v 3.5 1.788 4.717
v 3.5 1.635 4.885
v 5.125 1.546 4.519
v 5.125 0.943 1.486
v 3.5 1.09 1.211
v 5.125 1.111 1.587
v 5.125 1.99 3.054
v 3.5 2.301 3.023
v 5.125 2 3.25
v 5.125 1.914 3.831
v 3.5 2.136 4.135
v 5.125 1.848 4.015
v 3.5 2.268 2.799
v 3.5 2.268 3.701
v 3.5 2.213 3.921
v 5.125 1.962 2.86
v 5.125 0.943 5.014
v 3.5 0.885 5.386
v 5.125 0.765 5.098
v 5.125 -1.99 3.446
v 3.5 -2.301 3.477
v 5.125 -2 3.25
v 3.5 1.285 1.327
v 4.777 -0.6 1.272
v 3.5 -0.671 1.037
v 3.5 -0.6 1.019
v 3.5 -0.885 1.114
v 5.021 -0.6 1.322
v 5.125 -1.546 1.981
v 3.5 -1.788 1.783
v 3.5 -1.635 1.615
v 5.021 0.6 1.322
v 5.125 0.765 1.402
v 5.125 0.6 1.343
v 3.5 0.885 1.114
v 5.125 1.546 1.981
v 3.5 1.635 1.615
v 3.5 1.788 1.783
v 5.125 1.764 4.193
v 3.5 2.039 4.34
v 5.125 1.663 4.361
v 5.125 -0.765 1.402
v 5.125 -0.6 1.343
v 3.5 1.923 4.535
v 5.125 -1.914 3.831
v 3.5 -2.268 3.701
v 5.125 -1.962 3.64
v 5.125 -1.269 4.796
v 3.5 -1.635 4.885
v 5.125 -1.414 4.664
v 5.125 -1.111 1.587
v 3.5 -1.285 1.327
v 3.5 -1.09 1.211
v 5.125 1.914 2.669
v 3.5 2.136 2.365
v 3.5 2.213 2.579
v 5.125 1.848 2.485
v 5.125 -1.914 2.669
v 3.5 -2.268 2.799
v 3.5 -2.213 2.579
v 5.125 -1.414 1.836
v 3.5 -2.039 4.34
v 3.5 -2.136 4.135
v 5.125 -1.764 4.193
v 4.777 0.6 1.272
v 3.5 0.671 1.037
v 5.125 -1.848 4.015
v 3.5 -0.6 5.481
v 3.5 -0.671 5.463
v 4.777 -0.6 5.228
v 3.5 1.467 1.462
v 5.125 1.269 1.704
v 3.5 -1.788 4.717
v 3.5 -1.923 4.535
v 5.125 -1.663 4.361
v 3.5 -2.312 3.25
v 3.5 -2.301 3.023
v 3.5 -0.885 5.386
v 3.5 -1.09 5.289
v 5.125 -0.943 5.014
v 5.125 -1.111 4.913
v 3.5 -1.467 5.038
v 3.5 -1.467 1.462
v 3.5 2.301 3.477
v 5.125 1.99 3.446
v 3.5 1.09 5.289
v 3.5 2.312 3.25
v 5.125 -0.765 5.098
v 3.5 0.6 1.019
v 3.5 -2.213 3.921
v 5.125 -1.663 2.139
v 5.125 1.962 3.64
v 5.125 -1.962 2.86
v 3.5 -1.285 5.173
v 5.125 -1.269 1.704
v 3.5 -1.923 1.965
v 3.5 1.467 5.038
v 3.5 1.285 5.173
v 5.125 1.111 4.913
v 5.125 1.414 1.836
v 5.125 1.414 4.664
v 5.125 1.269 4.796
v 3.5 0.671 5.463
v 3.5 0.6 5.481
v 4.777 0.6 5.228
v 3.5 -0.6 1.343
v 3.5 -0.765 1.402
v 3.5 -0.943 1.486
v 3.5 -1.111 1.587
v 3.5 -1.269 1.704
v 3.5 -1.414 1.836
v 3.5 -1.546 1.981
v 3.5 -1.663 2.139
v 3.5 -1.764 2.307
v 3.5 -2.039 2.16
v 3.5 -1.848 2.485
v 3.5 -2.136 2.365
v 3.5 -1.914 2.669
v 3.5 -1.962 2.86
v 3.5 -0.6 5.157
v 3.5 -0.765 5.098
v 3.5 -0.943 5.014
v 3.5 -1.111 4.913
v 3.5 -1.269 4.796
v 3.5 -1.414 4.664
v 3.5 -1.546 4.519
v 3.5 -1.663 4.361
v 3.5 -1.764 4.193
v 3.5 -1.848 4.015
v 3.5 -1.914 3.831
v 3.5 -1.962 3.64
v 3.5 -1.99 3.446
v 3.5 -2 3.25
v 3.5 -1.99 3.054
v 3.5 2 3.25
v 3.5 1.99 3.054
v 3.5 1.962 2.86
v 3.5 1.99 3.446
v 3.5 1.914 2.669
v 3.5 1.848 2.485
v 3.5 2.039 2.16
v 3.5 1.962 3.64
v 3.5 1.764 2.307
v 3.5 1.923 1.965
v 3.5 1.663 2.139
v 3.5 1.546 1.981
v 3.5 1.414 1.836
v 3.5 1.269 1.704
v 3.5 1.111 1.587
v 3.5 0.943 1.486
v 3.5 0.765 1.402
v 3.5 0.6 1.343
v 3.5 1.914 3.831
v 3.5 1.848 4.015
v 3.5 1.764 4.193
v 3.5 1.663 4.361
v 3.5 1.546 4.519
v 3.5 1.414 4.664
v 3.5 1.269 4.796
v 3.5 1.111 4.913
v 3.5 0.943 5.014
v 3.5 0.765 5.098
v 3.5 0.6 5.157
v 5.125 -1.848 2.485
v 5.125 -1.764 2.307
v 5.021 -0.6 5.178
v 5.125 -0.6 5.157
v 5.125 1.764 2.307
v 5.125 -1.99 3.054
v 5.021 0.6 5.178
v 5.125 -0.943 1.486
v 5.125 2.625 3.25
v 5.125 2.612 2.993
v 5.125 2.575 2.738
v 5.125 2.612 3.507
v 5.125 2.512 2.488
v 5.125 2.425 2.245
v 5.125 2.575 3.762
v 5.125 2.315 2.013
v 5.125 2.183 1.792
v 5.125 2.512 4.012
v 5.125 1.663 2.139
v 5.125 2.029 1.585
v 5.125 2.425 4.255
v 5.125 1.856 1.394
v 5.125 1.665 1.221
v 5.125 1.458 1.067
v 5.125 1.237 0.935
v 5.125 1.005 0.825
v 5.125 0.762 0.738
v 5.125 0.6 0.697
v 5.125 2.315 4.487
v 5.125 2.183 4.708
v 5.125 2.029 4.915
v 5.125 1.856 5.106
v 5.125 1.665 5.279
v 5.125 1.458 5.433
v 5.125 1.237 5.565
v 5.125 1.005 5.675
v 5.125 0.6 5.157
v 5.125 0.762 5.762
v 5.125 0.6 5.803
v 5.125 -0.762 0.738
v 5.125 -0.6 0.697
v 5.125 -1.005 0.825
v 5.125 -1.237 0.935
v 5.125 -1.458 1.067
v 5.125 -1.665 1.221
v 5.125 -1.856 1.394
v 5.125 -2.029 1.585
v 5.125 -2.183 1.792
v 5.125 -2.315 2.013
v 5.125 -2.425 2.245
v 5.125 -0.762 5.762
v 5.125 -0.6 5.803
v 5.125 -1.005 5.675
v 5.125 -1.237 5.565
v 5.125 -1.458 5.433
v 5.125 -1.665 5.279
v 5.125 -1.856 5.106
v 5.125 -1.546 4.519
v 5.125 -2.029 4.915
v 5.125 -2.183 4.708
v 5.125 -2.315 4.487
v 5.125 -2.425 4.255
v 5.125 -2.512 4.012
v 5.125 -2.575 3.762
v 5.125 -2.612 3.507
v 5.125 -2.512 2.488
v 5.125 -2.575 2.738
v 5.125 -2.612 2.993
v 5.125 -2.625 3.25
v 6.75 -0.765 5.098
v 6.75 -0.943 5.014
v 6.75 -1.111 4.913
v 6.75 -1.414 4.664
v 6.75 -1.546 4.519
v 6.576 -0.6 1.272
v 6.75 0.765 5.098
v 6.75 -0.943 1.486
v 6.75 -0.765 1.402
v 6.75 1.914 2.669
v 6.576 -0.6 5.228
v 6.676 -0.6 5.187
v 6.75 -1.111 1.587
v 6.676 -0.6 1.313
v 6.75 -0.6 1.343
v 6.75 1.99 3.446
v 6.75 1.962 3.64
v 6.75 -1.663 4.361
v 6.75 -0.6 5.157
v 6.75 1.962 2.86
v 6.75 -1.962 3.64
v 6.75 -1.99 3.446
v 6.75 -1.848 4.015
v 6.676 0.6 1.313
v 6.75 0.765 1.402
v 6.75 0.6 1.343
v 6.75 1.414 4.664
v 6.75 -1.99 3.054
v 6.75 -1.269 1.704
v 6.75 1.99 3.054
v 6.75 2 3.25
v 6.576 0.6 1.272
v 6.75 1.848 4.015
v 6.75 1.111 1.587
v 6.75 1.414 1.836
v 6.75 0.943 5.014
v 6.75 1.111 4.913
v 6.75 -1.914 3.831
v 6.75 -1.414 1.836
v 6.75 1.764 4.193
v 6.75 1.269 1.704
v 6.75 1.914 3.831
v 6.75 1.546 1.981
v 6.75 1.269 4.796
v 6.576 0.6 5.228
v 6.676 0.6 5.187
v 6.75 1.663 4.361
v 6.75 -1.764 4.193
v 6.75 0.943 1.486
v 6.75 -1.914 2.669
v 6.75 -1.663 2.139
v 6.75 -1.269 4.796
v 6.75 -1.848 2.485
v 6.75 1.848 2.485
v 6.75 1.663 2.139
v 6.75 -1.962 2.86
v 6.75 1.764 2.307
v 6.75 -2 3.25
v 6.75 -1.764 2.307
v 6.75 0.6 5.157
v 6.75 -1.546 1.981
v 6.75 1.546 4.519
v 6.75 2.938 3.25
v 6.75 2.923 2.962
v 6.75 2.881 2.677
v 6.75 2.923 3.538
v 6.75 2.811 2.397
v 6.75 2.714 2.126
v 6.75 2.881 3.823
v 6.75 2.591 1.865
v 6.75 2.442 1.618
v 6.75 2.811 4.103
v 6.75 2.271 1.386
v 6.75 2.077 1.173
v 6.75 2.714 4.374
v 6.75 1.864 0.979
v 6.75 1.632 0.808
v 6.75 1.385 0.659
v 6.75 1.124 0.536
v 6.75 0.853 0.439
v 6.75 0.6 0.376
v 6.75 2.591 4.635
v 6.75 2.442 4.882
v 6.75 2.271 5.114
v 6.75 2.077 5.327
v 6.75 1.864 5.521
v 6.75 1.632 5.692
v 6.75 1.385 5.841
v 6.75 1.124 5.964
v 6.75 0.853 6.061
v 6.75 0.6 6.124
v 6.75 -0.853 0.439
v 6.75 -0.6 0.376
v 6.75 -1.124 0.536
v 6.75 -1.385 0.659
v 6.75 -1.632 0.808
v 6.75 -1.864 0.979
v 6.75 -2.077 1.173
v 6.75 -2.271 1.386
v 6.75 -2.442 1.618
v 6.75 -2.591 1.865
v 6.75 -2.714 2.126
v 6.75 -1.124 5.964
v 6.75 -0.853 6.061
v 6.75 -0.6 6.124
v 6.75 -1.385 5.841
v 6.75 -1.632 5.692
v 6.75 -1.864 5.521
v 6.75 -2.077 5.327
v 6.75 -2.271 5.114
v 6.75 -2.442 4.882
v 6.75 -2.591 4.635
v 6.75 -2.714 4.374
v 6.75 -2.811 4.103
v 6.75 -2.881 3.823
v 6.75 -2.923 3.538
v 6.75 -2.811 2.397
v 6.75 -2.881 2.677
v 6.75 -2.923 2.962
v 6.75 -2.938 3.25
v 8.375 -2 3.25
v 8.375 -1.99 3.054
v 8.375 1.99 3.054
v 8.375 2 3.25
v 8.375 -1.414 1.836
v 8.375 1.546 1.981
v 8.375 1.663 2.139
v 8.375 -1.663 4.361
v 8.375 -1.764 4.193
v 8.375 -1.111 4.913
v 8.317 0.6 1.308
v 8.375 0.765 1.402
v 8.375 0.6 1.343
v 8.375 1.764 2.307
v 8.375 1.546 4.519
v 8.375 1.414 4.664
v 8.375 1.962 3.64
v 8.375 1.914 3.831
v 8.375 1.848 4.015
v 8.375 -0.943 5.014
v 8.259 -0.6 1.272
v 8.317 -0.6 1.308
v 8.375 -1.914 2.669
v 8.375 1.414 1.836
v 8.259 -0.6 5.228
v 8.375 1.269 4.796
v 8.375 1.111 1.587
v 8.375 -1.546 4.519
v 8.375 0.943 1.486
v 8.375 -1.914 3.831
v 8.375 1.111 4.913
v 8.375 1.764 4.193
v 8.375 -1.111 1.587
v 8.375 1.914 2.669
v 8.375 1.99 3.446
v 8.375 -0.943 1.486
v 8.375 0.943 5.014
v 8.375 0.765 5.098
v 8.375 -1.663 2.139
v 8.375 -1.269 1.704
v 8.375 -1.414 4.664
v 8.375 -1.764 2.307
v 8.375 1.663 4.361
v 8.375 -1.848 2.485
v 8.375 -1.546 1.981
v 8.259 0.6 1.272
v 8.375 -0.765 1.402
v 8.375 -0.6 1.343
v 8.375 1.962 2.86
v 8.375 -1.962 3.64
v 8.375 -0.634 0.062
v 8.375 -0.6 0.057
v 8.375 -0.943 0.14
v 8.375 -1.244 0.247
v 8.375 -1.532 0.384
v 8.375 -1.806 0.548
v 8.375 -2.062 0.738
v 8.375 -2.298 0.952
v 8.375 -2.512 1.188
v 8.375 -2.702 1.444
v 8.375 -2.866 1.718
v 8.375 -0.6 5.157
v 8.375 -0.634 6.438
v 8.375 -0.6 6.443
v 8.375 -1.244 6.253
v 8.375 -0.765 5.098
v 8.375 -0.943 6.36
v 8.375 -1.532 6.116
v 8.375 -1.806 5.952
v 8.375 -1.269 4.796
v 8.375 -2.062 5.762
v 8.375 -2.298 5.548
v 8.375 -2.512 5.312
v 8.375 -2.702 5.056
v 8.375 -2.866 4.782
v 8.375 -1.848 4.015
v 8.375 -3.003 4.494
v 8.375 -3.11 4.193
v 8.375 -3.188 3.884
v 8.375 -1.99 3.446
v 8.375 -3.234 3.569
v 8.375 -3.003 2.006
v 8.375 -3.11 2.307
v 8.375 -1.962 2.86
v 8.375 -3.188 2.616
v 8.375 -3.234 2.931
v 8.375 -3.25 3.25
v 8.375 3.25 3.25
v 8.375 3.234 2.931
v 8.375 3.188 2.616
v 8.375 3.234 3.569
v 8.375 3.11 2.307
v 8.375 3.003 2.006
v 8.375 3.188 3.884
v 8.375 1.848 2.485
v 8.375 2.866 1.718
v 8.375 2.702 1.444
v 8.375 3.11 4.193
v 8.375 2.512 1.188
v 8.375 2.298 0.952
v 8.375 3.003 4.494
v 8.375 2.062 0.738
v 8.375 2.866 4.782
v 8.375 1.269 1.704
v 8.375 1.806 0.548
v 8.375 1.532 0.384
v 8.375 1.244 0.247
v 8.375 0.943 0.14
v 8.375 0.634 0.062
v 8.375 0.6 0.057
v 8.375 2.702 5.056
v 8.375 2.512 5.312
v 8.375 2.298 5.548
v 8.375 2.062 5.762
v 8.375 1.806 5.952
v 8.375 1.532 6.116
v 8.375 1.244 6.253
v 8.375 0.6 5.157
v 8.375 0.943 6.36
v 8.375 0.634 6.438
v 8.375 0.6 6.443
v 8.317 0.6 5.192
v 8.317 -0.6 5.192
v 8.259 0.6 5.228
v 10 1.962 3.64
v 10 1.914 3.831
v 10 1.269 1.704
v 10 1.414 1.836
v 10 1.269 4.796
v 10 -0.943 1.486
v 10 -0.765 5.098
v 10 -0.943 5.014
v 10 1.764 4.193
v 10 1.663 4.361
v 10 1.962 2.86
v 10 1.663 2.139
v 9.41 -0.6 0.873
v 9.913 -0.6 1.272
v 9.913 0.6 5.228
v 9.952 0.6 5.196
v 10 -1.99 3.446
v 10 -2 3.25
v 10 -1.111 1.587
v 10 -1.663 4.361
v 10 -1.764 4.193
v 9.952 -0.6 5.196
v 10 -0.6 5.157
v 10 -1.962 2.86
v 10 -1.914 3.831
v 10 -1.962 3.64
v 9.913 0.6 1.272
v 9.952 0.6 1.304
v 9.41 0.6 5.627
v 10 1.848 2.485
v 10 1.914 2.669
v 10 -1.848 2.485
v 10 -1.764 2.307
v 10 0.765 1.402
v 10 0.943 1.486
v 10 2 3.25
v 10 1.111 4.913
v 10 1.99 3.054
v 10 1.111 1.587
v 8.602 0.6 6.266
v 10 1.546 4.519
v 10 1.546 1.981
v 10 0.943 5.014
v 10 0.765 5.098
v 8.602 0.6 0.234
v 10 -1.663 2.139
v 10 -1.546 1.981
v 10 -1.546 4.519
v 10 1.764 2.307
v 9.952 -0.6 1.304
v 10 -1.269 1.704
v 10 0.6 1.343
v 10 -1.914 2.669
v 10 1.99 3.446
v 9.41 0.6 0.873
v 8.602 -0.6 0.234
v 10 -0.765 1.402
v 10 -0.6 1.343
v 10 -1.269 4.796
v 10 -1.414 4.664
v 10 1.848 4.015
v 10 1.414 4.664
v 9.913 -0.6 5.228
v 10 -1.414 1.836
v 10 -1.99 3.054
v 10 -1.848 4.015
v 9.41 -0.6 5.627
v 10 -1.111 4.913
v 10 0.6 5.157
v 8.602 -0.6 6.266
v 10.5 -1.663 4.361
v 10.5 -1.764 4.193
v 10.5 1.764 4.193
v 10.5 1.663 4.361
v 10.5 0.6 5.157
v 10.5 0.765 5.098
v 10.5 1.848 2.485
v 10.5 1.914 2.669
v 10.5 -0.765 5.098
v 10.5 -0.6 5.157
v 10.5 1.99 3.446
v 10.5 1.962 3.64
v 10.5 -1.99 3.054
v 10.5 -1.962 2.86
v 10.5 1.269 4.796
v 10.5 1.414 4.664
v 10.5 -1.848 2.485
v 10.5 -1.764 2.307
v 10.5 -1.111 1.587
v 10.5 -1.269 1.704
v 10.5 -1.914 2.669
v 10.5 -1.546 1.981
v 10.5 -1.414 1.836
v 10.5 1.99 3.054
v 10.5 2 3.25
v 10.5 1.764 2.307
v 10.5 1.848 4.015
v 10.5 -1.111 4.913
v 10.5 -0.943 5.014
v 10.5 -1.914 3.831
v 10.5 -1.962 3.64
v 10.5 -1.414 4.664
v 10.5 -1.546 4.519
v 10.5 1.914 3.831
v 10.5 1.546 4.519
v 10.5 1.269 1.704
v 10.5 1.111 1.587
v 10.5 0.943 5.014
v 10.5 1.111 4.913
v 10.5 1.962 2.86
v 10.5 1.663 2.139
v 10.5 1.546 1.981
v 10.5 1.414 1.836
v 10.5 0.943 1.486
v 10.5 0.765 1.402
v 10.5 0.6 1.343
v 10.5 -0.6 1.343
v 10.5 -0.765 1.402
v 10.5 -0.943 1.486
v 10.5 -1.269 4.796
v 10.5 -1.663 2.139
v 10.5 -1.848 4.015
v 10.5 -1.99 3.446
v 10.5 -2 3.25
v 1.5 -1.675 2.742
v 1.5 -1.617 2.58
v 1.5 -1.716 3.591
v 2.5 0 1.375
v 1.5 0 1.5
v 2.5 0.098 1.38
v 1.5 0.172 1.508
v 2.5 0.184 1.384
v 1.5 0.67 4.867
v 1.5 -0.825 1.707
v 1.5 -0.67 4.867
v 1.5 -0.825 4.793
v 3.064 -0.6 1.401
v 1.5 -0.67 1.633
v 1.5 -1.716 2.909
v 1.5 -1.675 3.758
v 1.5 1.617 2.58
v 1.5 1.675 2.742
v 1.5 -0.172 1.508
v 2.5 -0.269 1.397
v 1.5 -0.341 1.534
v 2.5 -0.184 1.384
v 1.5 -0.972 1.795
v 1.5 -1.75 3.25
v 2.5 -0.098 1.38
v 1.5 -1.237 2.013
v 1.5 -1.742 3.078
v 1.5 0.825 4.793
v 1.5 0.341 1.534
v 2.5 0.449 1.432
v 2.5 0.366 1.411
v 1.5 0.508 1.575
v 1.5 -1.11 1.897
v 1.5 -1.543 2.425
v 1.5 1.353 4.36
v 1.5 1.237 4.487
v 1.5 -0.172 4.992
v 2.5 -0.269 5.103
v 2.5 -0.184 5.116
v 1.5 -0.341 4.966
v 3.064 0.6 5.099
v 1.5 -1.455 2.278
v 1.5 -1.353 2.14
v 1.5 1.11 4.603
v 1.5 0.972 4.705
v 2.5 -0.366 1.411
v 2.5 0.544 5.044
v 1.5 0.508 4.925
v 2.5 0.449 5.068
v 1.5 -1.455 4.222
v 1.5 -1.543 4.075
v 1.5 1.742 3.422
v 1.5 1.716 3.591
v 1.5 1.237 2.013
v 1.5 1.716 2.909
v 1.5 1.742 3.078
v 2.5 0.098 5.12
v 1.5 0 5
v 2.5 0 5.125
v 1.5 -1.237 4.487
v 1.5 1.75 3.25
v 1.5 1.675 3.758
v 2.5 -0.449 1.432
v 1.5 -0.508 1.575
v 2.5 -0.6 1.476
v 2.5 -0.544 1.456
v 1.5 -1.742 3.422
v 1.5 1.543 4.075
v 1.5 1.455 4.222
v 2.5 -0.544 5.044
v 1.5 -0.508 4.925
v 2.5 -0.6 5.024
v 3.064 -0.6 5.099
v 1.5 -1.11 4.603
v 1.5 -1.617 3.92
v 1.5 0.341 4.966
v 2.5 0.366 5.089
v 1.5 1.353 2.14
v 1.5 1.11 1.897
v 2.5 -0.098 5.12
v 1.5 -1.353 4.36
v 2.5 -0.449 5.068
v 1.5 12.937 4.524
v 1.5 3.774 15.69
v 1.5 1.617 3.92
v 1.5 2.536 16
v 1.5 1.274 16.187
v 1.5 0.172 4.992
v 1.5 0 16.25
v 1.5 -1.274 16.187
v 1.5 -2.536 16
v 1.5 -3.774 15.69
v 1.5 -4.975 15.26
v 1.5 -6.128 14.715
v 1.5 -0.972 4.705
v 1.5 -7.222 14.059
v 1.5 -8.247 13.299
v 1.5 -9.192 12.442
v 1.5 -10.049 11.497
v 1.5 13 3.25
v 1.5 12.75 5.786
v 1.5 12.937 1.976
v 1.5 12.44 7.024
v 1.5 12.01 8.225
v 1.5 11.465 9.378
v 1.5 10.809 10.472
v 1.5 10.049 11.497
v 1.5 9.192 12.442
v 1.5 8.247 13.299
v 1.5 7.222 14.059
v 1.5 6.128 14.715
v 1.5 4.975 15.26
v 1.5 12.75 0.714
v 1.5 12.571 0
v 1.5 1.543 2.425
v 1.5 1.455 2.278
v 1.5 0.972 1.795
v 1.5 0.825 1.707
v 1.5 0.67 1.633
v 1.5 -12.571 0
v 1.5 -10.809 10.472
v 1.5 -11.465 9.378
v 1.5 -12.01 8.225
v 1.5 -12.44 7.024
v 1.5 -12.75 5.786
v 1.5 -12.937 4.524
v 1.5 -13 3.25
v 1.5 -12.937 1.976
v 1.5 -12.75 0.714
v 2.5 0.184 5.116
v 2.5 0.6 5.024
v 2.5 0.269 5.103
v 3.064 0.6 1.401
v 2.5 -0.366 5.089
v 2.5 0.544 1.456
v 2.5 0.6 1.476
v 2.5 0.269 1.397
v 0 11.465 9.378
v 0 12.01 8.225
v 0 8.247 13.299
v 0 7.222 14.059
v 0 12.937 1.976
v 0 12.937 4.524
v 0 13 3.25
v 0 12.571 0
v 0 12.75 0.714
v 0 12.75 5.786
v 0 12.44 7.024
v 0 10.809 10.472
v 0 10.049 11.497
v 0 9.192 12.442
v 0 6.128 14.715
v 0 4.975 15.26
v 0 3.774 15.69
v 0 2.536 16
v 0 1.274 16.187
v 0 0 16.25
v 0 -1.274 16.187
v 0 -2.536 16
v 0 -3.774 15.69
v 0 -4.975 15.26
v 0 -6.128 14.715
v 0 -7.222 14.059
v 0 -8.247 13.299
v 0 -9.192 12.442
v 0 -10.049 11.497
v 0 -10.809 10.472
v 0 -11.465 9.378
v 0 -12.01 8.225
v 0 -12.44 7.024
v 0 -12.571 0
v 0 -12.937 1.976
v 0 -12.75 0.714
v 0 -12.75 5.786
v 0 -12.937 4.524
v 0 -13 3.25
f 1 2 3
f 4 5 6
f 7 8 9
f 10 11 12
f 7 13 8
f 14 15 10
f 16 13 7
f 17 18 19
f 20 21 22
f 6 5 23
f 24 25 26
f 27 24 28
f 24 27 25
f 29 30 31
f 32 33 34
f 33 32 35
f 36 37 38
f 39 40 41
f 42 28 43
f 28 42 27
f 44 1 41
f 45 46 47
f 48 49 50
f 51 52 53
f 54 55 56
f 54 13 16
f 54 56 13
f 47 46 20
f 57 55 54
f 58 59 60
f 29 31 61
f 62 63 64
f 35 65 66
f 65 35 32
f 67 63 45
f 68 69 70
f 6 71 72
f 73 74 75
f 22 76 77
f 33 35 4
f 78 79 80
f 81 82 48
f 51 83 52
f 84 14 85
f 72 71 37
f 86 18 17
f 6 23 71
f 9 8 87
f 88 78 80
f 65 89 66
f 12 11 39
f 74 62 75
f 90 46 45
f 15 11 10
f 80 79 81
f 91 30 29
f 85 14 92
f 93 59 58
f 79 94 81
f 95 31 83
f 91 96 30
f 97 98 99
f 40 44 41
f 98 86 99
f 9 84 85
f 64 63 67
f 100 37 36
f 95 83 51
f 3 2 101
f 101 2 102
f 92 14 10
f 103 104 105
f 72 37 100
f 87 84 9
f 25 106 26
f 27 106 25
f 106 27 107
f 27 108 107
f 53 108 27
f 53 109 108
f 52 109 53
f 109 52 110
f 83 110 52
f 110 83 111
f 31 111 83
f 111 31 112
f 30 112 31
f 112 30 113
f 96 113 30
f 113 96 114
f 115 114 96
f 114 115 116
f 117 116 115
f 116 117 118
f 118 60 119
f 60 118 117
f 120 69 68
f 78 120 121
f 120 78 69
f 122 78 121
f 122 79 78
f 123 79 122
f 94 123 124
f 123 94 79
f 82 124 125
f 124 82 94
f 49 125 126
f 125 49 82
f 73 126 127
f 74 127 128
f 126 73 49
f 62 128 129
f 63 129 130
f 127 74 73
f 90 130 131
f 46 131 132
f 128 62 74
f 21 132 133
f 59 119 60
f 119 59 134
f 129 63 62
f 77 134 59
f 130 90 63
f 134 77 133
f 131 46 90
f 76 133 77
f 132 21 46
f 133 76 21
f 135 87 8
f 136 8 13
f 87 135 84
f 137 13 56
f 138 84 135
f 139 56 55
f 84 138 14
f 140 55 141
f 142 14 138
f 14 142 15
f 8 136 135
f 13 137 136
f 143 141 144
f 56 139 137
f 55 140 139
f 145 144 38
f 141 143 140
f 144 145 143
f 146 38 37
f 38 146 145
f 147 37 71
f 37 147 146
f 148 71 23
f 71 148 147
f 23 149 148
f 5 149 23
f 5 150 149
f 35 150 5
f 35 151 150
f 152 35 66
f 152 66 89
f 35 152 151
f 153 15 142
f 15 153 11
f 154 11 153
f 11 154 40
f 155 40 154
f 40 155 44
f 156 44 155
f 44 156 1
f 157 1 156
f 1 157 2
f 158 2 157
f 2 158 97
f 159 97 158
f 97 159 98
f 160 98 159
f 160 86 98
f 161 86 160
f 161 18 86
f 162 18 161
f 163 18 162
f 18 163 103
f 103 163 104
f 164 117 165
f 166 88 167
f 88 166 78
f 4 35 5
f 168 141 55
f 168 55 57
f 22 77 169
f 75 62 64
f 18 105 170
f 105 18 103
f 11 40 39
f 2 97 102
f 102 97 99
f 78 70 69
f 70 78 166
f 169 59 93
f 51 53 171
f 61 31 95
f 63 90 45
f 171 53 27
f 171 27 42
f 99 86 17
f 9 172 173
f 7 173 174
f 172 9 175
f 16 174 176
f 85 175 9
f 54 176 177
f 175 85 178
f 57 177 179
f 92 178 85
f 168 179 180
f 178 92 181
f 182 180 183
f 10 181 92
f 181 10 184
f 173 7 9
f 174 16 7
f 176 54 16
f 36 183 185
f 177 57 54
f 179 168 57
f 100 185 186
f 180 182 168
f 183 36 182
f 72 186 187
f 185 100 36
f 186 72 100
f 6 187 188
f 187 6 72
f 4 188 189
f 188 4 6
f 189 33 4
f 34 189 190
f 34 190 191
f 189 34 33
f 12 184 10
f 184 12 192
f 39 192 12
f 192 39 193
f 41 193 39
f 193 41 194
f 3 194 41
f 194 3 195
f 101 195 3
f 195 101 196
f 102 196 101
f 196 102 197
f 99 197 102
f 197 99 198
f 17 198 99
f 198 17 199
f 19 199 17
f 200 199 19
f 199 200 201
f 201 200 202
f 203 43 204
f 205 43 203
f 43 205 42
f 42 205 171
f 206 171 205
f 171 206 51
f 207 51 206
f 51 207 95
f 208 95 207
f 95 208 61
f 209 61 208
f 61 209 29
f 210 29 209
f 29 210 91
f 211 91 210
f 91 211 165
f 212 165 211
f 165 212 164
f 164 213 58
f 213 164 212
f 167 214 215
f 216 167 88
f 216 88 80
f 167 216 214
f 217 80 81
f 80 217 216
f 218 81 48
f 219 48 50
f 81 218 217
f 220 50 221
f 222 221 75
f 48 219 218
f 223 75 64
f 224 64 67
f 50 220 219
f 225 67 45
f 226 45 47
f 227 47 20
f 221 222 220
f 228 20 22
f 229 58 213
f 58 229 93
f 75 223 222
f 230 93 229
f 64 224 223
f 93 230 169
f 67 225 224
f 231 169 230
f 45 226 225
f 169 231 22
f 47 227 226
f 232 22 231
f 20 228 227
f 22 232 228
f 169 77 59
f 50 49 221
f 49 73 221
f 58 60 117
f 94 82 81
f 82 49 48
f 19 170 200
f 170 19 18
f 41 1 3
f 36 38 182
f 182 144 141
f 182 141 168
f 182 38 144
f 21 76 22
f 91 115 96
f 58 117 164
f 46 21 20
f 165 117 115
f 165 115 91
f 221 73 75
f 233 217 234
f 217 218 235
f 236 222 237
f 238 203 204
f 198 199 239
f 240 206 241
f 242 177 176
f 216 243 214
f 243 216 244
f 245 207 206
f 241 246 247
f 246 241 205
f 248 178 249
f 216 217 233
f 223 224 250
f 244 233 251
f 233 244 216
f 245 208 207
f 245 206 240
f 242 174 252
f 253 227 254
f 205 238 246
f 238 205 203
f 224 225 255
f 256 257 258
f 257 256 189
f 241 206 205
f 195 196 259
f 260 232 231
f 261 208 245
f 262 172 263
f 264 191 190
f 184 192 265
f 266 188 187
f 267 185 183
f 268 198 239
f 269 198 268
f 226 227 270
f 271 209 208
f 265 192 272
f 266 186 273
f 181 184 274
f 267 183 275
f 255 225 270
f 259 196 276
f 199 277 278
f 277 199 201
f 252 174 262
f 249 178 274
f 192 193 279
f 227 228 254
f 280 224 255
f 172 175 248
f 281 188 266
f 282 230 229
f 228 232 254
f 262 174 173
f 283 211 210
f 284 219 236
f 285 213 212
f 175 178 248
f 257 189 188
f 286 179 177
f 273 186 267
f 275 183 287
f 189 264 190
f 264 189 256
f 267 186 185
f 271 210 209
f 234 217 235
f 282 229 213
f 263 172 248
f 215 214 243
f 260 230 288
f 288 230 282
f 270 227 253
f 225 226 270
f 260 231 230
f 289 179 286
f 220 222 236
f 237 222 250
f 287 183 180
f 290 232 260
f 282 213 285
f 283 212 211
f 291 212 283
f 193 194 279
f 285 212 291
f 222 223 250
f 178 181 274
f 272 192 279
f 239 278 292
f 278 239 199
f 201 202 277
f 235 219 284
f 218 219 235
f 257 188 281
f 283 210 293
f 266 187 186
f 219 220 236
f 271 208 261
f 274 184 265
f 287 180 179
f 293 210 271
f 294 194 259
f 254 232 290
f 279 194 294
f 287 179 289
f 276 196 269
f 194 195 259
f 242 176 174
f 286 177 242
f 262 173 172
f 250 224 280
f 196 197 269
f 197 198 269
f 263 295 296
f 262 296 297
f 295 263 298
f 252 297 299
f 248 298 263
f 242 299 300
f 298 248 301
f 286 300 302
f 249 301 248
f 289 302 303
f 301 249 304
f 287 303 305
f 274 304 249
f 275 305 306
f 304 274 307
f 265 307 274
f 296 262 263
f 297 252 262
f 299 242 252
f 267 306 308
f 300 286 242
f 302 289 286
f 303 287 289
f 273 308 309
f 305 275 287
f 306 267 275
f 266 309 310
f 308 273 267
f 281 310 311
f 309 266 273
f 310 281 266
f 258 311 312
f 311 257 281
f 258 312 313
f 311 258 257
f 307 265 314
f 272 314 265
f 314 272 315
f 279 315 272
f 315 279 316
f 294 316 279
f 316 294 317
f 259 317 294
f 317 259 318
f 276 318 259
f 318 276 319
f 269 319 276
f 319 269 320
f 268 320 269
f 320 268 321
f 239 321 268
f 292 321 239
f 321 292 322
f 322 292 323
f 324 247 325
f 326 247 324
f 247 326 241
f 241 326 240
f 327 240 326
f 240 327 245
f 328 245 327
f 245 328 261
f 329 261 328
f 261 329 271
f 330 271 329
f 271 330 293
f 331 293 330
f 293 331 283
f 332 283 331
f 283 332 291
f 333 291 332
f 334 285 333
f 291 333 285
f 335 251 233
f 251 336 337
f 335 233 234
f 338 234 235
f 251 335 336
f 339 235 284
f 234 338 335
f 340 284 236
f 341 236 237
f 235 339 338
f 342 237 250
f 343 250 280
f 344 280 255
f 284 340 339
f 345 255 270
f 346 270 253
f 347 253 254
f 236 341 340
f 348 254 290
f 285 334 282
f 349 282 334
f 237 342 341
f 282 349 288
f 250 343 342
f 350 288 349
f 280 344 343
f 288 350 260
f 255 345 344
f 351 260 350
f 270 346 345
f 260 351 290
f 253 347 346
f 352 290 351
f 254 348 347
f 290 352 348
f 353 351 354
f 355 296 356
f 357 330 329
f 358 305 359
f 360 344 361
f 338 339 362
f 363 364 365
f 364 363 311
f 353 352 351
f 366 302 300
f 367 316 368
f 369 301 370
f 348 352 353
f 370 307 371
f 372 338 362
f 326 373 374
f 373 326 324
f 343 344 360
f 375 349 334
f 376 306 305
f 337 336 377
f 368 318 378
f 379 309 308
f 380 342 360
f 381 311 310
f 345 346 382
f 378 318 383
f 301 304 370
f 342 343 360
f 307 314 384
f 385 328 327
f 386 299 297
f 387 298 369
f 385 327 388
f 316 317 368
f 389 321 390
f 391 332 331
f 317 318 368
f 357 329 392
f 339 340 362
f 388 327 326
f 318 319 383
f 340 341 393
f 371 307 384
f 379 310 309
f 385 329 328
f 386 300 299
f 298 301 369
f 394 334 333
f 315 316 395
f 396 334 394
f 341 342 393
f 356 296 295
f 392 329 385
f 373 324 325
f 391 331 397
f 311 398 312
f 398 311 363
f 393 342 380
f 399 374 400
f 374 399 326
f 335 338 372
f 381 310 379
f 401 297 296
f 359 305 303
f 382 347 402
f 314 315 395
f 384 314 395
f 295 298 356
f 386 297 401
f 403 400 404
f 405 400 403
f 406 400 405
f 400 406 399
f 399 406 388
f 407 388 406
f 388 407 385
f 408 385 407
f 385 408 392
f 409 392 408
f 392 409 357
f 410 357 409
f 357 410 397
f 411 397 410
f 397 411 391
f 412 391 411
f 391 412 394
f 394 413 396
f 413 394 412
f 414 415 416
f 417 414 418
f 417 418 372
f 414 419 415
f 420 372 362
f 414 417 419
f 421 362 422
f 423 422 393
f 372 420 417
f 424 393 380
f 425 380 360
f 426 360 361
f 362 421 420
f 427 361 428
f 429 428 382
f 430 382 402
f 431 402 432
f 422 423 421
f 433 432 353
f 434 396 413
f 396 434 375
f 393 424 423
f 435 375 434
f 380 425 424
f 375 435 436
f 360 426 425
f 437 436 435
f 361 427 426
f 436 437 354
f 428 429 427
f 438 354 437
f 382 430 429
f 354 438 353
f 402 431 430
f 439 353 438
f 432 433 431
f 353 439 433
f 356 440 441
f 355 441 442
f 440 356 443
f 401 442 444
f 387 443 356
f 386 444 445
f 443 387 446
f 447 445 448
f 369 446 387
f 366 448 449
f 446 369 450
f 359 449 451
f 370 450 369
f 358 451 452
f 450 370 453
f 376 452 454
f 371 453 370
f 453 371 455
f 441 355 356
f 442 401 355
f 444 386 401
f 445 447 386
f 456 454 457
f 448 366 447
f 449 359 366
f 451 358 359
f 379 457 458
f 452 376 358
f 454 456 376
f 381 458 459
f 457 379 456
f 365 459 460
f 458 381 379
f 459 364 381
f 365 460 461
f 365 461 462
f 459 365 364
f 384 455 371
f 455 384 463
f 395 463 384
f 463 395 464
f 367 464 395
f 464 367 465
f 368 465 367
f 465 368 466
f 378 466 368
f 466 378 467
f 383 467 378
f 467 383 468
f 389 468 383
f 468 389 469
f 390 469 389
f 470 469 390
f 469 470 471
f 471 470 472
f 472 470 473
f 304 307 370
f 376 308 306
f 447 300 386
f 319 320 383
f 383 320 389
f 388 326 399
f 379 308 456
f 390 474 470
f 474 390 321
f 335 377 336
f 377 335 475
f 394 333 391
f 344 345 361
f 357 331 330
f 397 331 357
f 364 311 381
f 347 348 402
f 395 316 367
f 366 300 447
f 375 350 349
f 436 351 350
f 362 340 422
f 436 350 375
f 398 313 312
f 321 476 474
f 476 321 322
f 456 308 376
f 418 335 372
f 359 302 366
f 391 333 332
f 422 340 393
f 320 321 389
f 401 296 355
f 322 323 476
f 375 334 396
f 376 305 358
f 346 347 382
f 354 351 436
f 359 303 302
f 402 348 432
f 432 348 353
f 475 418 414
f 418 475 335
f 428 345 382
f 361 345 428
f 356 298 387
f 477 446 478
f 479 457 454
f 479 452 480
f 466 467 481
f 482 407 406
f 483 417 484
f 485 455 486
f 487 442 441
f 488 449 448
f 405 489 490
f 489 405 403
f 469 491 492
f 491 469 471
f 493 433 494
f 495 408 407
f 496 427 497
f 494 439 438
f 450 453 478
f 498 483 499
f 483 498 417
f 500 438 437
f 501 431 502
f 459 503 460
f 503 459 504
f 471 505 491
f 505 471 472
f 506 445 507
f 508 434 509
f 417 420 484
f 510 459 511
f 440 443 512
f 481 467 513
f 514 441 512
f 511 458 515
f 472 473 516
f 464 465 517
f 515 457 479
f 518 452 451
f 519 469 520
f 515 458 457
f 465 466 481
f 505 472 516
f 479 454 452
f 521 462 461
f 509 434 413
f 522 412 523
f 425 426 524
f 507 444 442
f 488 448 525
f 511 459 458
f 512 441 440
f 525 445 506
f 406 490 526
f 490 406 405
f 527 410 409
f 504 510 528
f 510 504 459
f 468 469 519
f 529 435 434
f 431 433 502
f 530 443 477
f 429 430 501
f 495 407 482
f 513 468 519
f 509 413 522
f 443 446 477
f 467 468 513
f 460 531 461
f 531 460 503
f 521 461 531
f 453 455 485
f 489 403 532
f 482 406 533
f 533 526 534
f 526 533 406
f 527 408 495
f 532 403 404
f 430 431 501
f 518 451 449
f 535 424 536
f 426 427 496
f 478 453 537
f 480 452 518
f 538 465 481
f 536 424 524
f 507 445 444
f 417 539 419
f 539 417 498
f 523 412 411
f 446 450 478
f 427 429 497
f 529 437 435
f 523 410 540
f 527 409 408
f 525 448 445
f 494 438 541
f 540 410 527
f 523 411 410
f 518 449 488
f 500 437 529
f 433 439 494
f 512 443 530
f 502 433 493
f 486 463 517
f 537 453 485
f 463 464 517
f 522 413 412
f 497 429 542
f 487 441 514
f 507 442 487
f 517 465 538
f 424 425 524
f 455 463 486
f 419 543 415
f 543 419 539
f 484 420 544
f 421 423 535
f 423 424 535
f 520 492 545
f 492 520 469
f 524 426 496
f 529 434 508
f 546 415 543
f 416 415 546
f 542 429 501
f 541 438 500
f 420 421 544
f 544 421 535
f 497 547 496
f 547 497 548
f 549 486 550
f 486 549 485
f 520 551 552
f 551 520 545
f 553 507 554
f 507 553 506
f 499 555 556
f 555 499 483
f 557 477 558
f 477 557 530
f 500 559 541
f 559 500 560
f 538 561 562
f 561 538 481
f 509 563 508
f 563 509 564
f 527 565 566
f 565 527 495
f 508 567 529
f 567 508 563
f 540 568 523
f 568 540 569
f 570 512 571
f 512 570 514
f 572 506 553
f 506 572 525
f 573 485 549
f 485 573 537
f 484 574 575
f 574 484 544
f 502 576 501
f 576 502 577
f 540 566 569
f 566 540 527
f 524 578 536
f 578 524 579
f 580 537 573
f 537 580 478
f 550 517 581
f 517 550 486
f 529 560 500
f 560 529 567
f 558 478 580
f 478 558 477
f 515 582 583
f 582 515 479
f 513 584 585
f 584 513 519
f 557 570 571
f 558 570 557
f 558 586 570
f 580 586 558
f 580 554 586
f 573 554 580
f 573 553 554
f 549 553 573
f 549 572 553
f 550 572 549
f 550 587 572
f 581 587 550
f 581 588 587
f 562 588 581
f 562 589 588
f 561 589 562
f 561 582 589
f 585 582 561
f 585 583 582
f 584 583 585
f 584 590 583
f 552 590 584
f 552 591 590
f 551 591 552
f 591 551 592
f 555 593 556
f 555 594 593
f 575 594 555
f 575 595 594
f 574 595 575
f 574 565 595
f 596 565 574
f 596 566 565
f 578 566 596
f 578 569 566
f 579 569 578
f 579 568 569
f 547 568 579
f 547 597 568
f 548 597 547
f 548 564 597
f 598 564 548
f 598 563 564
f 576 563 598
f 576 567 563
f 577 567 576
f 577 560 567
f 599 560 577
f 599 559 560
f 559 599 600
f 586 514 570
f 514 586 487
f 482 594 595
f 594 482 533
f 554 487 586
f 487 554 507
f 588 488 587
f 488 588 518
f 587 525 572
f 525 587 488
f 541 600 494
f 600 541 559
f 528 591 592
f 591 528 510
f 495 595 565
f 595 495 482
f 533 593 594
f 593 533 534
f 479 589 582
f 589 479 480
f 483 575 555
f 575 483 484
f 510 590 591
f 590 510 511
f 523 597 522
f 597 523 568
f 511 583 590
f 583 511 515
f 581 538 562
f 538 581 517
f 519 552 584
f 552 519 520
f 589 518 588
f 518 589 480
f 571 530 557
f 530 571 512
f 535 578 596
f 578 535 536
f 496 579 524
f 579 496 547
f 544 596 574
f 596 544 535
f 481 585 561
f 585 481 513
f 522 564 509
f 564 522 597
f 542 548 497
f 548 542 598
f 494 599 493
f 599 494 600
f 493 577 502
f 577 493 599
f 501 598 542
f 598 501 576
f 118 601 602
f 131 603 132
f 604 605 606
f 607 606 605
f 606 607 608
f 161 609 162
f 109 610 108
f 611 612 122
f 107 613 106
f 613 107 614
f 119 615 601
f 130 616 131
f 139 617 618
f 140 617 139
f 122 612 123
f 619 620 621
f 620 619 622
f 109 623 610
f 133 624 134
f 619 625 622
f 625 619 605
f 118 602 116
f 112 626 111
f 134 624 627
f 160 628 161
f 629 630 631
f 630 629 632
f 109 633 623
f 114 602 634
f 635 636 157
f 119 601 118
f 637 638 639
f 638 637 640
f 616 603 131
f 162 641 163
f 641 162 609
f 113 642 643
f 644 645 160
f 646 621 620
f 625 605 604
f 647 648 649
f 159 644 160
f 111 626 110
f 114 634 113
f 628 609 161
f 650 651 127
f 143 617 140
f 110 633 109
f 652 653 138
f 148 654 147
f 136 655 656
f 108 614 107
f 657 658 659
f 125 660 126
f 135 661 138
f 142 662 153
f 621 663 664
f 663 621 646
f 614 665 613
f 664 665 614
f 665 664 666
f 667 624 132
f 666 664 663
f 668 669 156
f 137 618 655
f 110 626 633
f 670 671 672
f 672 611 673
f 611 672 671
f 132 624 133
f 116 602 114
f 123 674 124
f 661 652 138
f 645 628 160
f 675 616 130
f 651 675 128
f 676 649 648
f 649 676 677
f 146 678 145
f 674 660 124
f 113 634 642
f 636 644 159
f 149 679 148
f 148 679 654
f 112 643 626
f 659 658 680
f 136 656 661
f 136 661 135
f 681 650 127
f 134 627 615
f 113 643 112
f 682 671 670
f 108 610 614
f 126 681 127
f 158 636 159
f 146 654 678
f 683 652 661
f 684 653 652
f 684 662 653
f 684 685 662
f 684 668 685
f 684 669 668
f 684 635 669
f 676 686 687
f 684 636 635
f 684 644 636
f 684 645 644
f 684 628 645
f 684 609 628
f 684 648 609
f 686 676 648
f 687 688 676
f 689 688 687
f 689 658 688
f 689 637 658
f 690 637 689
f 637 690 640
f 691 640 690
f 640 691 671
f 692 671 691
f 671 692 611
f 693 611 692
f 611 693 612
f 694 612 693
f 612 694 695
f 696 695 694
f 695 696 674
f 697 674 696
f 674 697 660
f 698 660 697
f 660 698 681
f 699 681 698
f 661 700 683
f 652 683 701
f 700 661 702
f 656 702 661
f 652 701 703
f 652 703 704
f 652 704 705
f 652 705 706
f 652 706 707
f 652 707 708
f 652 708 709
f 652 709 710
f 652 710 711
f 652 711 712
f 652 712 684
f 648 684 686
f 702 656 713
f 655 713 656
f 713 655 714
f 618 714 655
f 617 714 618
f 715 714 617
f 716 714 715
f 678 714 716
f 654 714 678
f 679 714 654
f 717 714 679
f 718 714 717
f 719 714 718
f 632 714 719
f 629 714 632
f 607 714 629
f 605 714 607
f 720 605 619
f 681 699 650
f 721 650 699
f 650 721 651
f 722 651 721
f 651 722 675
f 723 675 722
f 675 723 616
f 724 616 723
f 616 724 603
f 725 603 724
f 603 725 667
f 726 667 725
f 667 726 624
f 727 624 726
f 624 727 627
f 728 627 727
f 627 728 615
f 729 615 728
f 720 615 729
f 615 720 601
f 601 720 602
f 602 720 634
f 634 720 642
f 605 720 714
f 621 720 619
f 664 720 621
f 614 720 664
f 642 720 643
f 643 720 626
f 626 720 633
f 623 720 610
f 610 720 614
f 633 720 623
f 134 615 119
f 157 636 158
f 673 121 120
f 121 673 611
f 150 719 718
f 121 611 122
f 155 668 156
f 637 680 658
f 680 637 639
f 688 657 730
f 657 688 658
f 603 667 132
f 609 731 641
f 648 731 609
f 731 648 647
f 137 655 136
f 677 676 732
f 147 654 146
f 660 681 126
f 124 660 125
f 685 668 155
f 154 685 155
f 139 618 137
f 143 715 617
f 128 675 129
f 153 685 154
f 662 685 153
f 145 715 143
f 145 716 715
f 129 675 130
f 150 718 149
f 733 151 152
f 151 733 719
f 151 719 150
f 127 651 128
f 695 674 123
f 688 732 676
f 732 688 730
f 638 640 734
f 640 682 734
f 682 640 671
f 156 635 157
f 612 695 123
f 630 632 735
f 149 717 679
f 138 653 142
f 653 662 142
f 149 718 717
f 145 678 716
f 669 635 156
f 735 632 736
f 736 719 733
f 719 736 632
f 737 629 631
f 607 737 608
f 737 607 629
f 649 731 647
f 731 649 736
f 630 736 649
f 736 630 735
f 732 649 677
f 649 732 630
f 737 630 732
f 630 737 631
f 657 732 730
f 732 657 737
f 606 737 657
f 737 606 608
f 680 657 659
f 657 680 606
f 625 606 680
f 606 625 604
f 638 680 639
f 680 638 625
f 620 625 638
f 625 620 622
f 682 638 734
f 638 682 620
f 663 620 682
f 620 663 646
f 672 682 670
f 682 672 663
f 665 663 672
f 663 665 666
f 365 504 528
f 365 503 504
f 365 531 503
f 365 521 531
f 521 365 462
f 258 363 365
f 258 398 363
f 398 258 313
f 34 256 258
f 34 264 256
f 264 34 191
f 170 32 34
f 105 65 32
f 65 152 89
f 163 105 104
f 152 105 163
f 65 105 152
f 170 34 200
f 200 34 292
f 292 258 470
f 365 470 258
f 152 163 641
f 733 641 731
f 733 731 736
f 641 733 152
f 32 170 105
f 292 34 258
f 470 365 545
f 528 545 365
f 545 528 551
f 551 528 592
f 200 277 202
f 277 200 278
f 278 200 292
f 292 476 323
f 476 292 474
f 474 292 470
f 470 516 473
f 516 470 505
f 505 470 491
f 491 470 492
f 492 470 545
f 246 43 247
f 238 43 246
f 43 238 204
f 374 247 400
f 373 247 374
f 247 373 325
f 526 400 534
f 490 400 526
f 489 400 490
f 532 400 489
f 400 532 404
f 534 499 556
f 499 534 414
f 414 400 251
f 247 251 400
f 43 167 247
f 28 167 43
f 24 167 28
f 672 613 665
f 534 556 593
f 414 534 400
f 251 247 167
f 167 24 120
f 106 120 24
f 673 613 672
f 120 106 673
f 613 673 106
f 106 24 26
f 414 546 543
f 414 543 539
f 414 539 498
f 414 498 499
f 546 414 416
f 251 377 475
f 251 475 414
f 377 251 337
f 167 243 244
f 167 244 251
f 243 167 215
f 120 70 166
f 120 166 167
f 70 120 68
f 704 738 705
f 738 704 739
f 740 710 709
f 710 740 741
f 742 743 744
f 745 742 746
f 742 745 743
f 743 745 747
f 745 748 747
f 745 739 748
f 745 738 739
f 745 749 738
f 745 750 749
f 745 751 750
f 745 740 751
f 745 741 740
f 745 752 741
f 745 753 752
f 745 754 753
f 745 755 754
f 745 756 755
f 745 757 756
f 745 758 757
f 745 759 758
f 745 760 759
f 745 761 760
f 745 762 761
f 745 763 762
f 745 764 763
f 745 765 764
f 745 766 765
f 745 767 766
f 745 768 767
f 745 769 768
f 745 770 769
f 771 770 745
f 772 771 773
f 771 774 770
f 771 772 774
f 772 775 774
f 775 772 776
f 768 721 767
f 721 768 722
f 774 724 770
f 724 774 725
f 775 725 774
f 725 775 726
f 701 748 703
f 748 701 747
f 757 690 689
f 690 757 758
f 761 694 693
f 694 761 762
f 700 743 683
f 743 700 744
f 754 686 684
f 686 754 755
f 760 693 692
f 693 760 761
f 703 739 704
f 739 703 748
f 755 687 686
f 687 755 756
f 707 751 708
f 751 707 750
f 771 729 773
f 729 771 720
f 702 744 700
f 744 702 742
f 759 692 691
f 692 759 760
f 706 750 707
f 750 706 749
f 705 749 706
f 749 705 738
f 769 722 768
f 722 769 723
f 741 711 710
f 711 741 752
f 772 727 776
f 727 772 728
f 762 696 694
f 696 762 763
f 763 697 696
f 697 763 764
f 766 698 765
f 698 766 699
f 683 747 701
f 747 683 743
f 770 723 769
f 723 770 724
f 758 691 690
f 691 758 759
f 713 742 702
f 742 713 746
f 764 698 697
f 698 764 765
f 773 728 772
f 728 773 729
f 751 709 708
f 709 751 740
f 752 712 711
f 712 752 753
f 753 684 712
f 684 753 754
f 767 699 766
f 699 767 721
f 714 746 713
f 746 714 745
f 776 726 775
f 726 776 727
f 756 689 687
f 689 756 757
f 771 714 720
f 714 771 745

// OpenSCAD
// --- Dimensions ---
h = 9;    // Height of the pin (above the cap)
d = 6.5;  // Max diameter of the hooked pin
od = 26;  // Outer diameter of the base cap
ch = 1.5; // Cap thickness / height

// --- Internal/Mechanism Parameters ---
shaft_d = 4;    // Diameter of the inner solid shaft
neck_d = 3.5;   // Diameter of the neck (solid part between cap and barbs)
barb_count = 4; // Number of hooks/barbs
slit_w = 1.2;   // Width of the slit creating the "U" shape

neck_h = 2; // Height of the smooth neck below the barbs

$fn = 64; // Resolution for smooth circles
tip_h = 0.5;

// 1. Define the original shape first
module pin_assembly() {
  union() {
    // Base Cap
    cylinder(h = ch, d = od);

    // Neck + Hooked Pin with slit through both
    barb_section_h = h - neck_h;
    translate([ 0, 0, ch ]) {
      difference() {
        union() {
          // Smooth neck (narrower, non-compressible solid)
          cylinder(h = neck_h, d1 = neck_d, d2 = shaft_d);

          // Barbed section
          translate([ 0, 0, neck_h ]) {
            cylinder(h = barb_section_h, d = shaft_d);
            barb_h = (barb_section_h - tip_h) / barb_count;
            for (i = [0:barb_count - 1]) {
              barb_outer_d =
                  d - (d - shaft_d) * (barb_count - 1 - i) / barb_count;
              translate([ 0, 0, i * barb_h ])
                  cylinder(h = barb_h, d1 = barb_outer_d, d2 = shaft_d);
            }
            // Tapered Tip
            translate([ 0, 0, barb_section_h - tip_h ])
                cylinder(h = tip_h, d1 = shaft_d, d2 = shaft_d - 1);
          }
        }

        // Slit only through barbed section (neck is solid)
        translate([ 0, 0, neck_h + barb_section_h / 2 ])
            cube([ d + 2, slit_w, barb_section_h + 2 ], center = true);
      }
    }
  }
}

// 2. Orient for side-printing and cut the flat base
// Move the entire part up so the new flat cut rests exactly on the build plate
// (Z=0)
translate([ 0, 0, d / 2 ]) difference() {
  // Lay the part on its side (Pin points along the X axis)
  rotate([ 0, 90, 0 ]) pin_assembly();

  // Slice off everything that hangs below the pin's bottom edge
  // The pin's lowest point is at Z = -d/2. We cut away the cap below that
  // point.
  translate([ 0, 0, -od / 2 - d / 2 ])
      cube([ (h + ch + neck_h) * 3, od + 5, od ], center = true);
}
